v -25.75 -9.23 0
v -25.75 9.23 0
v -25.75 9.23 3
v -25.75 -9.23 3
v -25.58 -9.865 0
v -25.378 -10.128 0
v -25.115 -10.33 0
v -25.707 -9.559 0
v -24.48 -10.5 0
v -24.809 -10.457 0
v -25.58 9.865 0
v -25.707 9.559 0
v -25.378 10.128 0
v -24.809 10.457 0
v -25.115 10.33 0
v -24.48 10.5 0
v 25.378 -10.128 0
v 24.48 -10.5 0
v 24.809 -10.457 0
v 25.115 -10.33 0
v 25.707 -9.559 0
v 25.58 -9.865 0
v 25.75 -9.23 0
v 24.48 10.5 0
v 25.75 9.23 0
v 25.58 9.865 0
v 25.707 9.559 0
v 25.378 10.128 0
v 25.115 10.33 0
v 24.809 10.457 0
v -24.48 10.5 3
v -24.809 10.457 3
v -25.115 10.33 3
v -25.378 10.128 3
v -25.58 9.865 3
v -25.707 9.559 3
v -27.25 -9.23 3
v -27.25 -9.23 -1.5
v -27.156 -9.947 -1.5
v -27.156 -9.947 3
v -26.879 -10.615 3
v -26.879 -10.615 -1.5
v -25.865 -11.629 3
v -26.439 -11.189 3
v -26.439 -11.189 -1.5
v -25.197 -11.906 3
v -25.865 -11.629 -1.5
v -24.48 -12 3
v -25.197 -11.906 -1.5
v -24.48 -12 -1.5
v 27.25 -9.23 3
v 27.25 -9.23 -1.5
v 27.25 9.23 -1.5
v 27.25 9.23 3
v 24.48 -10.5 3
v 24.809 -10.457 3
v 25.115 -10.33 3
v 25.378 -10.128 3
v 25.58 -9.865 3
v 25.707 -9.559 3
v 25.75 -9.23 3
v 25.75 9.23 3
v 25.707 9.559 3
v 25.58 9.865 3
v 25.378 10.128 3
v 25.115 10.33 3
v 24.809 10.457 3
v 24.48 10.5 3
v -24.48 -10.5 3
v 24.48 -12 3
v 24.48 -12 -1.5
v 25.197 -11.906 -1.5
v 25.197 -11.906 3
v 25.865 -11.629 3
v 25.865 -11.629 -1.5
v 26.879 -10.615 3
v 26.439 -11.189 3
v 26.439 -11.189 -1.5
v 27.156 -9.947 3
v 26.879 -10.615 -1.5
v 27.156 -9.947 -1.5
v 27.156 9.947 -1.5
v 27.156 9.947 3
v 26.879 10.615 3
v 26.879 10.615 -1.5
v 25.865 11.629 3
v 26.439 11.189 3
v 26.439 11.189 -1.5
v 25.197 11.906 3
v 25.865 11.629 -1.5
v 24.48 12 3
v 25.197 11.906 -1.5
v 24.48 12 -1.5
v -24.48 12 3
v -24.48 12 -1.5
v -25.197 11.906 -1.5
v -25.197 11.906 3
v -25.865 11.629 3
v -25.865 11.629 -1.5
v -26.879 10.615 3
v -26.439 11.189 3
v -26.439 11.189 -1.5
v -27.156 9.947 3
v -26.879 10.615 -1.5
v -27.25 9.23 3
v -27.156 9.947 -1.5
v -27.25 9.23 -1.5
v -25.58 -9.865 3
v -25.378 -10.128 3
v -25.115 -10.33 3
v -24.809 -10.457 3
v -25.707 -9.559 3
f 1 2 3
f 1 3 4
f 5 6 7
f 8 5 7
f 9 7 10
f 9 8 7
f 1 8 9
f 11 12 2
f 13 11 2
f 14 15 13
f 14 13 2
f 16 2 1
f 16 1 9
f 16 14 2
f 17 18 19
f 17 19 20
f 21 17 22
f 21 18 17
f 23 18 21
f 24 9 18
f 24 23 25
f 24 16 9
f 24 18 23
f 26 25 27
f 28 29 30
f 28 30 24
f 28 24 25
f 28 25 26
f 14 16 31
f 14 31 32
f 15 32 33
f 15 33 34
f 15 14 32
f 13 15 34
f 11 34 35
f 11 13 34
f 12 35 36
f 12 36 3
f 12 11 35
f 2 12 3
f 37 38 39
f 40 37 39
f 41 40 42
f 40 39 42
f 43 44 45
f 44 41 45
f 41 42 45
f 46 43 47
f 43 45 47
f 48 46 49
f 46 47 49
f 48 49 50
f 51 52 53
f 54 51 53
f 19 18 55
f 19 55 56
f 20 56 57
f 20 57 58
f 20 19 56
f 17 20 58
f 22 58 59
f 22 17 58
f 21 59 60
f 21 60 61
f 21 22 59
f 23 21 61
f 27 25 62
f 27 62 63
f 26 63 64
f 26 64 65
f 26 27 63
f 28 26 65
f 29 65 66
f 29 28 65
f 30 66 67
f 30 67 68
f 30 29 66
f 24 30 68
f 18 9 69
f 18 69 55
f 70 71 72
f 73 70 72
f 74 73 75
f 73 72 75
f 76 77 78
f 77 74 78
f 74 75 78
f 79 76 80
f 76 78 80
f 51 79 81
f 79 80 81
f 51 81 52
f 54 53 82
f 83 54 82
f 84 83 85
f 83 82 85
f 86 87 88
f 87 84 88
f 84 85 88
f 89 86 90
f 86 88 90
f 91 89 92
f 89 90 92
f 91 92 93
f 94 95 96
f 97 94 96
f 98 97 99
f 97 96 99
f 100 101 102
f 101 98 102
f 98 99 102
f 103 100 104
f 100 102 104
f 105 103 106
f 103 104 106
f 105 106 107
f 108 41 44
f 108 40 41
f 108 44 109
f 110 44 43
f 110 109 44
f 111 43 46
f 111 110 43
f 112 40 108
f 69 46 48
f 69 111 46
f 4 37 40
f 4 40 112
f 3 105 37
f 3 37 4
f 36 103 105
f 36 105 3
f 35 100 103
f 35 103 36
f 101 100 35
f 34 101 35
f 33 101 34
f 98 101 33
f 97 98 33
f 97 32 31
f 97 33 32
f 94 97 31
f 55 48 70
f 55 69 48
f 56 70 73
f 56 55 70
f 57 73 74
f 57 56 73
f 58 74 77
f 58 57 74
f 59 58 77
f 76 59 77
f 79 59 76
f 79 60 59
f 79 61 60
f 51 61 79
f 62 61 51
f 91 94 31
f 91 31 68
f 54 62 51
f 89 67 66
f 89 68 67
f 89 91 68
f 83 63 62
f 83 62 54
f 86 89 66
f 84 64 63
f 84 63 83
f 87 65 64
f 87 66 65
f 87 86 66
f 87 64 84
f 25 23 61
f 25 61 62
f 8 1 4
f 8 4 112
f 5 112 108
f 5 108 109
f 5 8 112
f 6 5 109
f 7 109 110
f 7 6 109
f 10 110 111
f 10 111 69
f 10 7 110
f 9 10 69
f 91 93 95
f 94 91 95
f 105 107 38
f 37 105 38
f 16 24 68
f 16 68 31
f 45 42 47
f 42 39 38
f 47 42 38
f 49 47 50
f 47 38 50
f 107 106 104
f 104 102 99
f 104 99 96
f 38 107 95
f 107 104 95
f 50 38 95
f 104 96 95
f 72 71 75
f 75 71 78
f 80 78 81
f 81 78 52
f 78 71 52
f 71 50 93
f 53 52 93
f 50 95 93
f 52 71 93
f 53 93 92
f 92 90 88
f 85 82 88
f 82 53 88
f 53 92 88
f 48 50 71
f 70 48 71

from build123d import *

# Parameters (mm, degrees)
BOSS_EXTRU_1_DEPTH = 3
COQUE1_T           = 1.5


with BuildPart() as part:
    # Esquisse1 → Boss.-Extru.1 (new body)
    with BuildSketch(Plane.XY):
        with BuildLine():
            Line((-24.48, -10.5), (24.48, -10.5))
            ThreePointArc((24.48, -10.5), (25.378025612, -10.128025612), (25.75, -9.23))
            Line((25.75, -9.23), (25.75, 9.23))
            ThreePointArc((25.75, 9.23), (25.378025612, 10.128025612), (24.48, 10.5))
            Line((24.48, 10.5), (-24.48, 10.5))
            ThreePointArc((-24.48, 10.5), (-25.378025612, 10.128025612), (-25.75, 9.23))
            Line((-25.75, 9.23), (-25.75, -9.23))
            ThreePointArc((-25.75, -9.23), (-25.378025612, -10.128025612), (-24.48, -10.5))
        make_face()
    extrude(amount=BOSS_EXTRU_1_DEPTH)

    # Coque1
    coque1_openings = [part.faces().sort_by_distance(p)[0] for p in [
        (0, 0, 3),
    ]]
    offset(amount=COQUE1_T, openings=coque1_openings, kind=Kind.INTERSECTION)


solid = part.part
